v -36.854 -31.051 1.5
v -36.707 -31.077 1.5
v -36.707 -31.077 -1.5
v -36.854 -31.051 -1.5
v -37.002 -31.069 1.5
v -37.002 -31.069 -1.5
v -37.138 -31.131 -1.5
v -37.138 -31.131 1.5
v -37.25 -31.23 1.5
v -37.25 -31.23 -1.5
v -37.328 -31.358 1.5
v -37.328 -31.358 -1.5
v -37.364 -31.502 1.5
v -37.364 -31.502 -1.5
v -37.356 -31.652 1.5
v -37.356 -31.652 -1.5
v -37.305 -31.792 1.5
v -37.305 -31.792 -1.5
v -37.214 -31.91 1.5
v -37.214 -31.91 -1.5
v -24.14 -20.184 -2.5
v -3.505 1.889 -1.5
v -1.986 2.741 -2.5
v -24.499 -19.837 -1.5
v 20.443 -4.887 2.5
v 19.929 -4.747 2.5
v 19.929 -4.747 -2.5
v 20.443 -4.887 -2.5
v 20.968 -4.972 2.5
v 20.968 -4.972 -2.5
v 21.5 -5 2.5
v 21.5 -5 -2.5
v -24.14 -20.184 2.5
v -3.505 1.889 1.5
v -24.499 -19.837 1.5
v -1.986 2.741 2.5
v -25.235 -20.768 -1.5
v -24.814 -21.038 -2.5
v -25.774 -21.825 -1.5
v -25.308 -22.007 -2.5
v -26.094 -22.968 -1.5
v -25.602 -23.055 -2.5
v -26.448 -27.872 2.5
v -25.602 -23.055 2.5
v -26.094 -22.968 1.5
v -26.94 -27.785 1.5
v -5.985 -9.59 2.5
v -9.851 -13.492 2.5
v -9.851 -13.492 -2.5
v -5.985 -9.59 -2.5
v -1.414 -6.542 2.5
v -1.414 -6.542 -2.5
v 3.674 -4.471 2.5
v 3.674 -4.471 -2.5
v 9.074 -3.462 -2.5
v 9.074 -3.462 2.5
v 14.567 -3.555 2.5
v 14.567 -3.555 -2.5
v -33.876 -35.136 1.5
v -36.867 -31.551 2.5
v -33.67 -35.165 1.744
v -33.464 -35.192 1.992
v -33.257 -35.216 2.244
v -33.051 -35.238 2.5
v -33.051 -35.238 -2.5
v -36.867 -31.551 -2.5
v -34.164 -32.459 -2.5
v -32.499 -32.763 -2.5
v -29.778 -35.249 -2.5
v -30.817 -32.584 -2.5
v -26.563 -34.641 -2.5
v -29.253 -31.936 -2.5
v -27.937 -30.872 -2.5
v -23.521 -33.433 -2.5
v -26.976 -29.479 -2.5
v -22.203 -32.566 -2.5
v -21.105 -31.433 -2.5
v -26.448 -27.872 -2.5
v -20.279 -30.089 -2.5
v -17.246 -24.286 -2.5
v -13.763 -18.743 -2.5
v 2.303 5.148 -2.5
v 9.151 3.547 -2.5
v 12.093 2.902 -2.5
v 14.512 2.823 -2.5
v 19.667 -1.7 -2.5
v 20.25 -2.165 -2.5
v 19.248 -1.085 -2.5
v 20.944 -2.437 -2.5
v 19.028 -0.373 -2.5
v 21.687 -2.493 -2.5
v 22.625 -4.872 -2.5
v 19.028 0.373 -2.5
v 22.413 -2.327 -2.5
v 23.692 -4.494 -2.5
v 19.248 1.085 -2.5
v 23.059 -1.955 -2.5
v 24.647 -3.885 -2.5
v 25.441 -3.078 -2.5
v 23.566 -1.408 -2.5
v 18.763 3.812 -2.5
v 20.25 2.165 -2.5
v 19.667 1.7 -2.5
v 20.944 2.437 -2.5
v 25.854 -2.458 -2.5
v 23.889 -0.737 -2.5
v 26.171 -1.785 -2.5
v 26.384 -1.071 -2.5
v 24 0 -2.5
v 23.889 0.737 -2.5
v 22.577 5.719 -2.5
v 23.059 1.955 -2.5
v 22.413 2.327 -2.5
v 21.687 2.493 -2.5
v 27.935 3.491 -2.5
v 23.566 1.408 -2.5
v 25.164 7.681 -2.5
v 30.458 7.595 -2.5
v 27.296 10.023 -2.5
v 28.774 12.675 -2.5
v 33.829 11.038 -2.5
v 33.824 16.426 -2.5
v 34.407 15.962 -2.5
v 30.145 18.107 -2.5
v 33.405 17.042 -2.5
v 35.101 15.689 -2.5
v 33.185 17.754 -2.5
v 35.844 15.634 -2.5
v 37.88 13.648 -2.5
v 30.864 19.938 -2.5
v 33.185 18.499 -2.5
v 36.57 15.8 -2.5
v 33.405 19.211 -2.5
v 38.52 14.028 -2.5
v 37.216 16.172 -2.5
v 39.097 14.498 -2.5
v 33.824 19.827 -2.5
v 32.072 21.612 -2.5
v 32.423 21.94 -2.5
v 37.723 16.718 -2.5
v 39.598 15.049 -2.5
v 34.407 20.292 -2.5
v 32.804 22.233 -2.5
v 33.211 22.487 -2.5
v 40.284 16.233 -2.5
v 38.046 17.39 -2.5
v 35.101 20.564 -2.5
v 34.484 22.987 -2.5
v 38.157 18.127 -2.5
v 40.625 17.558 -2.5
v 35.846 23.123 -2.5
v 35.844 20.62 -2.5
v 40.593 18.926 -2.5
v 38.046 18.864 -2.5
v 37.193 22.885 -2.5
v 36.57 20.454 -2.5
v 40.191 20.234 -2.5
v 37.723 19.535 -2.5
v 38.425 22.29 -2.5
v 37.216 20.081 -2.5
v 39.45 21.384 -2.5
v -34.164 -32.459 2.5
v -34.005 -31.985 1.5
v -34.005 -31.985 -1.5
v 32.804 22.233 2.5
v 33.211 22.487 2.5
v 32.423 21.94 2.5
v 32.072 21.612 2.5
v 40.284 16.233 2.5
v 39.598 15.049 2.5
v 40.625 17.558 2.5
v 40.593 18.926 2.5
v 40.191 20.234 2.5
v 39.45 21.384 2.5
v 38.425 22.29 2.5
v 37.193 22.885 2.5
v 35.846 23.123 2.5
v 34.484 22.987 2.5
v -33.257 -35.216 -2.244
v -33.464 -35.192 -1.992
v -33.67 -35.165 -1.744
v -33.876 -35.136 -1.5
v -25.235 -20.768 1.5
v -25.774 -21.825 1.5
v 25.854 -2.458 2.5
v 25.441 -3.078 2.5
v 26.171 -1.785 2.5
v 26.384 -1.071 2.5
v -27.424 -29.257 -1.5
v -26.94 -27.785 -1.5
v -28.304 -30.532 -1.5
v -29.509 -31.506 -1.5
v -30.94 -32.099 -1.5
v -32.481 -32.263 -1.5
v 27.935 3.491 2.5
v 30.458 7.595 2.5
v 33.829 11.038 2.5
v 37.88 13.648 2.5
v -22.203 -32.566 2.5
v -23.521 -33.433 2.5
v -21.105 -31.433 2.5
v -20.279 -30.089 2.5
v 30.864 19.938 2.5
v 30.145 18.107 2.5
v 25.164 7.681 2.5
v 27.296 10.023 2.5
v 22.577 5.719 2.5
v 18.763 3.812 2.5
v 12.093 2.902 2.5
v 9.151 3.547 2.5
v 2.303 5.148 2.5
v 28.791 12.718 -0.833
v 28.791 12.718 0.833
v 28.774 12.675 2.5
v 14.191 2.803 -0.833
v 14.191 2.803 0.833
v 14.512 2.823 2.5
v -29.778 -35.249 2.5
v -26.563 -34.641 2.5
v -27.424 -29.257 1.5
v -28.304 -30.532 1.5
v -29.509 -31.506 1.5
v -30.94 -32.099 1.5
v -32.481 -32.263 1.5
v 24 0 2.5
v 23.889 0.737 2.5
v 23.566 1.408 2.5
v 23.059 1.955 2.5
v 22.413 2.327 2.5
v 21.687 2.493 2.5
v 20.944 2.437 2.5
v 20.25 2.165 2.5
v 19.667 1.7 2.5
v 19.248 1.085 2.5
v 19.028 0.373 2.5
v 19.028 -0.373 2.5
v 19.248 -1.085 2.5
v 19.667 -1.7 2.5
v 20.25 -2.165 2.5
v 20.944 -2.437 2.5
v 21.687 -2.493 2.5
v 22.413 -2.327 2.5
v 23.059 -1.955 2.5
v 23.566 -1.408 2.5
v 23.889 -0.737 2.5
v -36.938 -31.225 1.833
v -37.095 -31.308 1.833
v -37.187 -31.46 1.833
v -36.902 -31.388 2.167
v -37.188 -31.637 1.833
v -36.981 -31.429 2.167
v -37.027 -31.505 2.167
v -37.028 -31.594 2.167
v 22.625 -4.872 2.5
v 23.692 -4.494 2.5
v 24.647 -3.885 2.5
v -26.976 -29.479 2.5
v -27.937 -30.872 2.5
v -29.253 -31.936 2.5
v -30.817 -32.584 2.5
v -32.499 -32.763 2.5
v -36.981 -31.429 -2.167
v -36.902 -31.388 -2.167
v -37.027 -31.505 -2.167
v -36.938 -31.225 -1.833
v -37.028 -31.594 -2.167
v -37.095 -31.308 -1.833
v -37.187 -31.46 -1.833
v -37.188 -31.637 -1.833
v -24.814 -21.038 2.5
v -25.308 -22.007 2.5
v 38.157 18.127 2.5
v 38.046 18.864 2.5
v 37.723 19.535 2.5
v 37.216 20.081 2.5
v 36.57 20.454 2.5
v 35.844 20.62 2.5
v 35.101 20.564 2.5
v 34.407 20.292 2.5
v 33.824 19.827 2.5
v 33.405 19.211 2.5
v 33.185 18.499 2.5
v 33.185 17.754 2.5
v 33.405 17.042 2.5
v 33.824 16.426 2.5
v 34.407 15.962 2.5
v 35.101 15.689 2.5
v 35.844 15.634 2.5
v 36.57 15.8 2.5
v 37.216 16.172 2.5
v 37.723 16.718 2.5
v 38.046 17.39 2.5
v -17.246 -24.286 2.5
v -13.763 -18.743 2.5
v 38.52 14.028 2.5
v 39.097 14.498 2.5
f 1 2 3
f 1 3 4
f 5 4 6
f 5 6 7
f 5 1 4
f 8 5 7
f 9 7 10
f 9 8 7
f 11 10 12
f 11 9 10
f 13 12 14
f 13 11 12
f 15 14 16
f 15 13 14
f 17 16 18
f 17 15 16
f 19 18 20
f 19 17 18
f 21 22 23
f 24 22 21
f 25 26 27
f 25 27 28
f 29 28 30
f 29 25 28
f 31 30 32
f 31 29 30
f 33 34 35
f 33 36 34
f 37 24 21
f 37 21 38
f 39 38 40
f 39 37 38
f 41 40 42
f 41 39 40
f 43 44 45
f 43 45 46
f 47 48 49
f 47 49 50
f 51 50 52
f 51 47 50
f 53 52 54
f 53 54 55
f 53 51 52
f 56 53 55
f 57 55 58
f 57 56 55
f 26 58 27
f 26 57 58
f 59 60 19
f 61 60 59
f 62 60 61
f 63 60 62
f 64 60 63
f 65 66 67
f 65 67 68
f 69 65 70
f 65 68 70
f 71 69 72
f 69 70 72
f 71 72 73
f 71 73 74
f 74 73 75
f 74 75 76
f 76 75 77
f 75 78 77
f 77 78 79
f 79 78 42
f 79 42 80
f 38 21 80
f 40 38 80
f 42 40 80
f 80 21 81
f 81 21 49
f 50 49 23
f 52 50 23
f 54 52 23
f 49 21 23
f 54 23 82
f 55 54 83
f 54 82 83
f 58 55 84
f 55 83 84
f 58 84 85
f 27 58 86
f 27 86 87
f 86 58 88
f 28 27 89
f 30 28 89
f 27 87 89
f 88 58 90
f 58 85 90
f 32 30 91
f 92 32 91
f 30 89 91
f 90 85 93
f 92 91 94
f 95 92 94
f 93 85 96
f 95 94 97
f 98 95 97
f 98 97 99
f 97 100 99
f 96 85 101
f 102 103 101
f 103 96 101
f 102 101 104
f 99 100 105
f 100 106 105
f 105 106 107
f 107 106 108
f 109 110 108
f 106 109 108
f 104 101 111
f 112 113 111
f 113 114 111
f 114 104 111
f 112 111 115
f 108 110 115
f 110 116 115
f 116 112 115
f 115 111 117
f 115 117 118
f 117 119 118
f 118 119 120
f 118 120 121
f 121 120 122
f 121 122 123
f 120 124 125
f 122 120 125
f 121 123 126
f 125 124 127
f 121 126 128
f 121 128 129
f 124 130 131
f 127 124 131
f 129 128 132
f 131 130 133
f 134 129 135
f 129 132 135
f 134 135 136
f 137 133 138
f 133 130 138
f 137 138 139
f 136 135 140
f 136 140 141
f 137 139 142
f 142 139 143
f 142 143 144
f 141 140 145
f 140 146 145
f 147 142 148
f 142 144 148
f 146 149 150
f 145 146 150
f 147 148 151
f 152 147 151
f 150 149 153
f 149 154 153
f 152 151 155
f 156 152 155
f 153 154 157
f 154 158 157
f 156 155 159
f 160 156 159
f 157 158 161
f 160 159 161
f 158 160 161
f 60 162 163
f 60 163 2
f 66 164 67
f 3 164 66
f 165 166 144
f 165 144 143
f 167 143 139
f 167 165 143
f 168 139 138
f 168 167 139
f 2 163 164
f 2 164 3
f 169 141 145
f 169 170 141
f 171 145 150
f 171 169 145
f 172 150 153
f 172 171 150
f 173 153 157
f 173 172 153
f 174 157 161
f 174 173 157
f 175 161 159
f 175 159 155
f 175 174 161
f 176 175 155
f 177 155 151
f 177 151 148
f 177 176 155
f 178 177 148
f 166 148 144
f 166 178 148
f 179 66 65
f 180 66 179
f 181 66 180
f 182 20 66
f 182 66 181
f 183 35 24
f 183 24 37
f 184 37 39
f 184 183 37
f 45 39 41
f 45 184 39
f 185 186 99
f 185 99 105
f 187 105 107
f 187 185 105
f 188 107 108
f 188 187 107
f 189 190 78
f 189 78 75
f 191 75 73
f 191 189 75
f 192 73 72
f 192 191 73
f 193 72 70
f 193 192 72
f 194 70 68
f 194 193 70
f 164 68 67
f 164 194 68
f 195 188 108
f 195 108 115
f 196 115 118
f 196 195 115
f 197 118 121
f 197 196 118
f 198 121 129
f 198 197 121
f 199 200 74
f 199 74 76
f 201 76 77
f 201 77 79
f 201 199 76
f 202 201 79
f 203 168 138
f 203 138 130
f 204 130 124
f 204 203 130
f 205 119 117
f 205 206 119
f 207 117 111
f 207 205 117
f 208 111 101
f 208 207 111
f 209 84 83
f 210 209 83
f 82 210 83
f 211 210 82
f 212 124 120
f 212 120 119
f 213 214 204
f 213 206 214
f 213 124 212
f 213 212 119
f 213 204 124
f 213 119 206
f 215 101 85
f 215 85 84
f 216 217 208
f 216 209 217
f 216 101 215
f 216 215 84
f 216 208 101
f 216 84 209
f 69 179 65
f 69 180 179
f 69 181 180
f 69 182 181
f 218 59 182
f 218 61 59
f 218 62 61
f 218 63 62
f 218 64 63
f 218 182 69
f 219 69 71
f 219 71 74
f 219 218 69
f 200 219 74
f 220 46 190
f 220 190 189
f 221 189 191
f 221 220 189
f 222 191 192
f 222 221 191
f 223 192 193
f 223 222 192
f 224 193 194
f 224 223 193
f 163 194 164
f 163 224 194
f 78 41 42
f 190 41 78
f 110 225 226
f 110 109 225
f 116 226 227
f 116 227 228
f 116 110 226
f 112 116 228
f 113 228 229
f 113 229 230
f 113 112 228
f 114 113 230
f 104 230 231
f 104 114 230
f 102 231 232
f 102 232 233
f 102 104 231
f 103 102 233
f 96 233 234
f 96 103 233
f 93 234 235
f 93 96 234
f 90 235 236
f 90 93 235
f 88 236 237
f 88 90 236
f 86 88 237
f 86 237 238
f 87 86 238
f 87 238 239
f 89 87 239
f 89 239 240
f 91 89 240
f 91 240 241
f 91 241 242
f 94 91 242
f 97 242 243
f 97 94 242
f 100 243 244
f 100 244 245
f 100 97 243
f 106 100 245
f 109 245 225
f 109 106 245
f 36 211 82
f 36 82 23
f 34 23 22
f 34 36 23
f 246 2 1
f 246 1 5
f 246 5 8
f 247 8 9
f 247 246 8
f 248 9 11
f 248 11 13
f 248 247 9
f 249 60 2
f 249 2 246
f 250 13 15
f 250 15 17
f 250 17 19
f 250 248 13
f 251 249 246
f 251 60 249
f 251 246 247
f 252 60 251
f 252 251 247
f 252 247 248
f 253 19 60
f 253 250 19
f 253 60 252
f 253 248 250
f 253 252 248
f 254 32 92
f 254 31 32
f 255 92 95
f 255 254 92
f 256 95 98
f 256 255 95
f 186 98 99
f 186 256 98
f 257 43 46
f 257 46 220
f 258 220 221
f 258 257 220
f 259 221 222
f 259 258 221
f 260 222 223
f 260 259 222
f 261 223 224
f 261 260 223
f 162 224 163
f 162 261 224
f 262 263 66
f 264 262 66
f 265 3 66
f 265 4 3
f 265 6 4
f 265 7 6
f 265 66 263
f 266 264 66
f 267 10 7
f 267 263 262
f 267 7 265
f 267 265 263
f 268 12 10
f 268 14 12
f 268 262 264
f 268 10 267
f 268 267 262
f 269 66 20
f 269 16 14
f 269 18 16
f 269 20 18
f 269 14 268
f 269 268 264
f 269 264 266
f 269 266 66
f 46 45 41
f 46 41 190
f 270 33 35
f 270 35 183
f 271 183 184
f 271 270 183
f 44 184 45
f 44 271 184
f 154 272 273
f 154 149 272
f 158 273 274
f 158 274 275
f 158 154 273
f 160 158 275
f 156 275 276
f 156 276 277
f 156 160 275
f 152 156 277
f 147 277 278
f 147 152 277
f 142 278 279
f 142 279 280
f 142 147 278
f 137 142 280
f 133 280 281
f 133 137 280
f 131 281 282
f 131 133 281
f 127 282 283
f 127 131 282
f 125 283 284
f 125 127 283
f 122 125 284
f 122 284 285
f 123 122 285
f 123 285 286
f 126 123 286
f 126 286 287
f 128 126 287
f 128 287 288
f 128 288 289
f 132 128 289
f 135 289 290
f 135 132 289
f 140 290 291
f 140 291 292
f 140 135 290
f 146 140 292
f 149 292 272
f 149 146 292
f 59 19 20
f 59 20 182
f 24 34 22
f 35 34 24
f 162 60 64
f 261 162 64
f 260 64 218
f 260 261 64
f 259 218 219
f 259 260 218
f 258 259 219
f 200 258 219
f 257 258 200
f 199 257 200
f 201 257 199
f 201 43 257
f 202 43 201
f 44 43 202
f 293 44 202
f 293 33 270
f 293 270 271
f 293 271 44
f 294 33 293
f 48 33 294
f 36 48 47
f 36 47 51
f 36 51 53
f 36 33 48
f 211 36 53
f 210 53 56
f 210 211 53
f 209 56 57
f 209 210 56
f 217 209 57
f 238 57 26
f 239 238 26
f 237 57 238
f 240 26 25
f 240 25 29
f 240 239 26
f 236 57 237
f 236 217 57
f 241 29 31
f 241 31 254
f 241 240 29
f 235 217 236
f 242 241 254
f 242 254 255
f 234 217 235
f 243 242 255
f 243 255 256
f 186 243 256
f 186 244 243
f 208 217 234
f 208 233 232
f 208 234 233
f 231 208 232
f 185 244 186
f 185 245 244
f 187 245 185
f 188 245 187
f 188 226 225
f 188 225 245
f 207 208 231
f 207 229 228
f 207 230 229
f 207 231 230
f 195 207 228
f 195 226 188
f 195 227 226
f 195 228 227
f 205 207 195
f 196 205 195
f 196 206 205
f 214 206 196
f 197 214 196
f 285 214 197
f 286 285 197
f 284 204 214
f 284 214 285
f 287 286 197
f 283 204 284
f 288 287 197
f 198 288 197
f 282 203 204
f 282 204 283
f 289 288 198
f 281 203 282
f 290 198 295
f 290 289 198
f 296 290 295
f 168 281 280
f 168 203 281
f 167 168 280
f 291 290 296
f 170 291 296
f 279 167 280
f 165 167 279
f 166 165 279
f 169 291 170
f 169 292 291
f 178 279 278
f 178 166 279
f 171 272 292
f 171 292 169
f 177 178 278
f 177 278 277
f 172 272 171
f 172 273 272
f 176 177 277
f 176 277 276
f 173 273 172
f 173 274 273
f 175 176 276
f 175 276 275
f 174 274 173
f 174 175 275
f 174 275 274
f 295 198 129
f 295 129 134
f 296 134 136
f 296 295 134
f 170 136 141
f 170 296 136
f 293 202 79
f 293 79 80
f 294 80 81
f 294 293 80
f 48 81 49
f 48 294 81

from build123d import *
from OCP.BRepFilletAPI import BRepFilletAPI_MakeChamfer

# Parameters (mm, degrees)
SKETCH_1_R          = 2.5
EXTRUDE_1_DEPTH     = 2.5
SKETCH_2_OUTSIDE_W  = 116.118
SKETCH_2_OUTSIDE_H  = 88.955
CUT_EXTRUDE_1_DEPTH = 5
CHAMFER_1_SIZE      = 1
CHAMFER_1_SIZE_2    = 0.5
CHAMFER_2_SIZE      = 0.5
CHAMFER_2_SIZE_2    = 1


with BuildPart() as part:
    # 草圖1 → 填料-伸長1 (new, symmetric)
    with BuildSketch(Plane.XY):
        with BuildLine():
            Line((33.210571119, 22.487406669), (9.212656684, 9.024071248))
            Line((9.212656684, 9.024071248), (9.212656684, 13.217540535))
            Line((9.212656684, 13.217540535), (-51.018500429, 13.217540535))
            Line((-51.018500429, 13.217540535), (-51.018500429, -41.386180002))
            Line((-51.018500429, -41.386180002), (9.212656684, -41.386180002))
            Line((9.212656684, -41.386180002), (9.212656684, -5))
            Line((9.212656684, -5), (21.5, -5))
            ThreePointArc((21.5, -5), (23.692257033, -4.493774483), (25.440603486, -3.07760364))
            Line((25.440603486, -3.07760364), (39.59758023, 15.049172396))
            ThreePointArc((39.59758023, 15.049172396), (39.450390654, 21.384077206), (33.210571119, 22.487406669))
        make_face()
        with Locations((21.5, 0)):
            Circle(SKETCH_1_R, mode=Mode.SUBTRACT)
        with Locations((35.656976744, 18.126776036)):
            Circle(SKETCH_1_R, mode=Mode.SUBTRACT)
    extrude(amount=EXTRUDE_1_DEPTH, both=True)

    # 草圖2 outside → 除料-伸長1 (cut)
    with BuildSketch(Plane.XY.offset(2.5)):
        with Locations((-5.181, -9.1295)):
            Rectangle(SKETCH_2_OUTSIDE_W, SKETCH_2_OUTSIDE_H)
        with BuildLine():
            Line((-3.504662874, 1.889387135), (-24.499095951, -19.837093245))
            ThreePointArc((-24.499095951, -19.837093245), (-25.530846828, -21.28330144), (-26.093887373, -22.968238639))
            Line((-26.093887373, -22.968238639), (-26.940110928, -27.785073774))
            ThreePointArc((-26.940110928, -27.785073774), (-29.508767127, -31.506192899), (-34.004940633, -31.984884889))
            Line((-34.004940633, -31.984884889), (-36.707285896, -31.076719678))
            ThreePointArc((-36.707285896, -31.076719678), (-37.293807717, -31.290934133), (-37.214008802, -31.910230356))
            Line((-37.214008802, -31.910230356), (-33.875603228, -35.136152419))
            ThreePointArc((-33.875603228, -35.136152419), (-28.5650672, -35.094081272), (-23.520676583, -33.433453021))
            ThreePointArc((-23.520676583, -33.433453021), (-21.623015625, -32.029319154), (-20.278640263, -30.088864592))
            ThreePointArc((-20.278640263, -30.088864592), (-15.559314436, -21.479893225), (-9.851228903, -13.492141112))
            ThreePointArc((-9.851228903, -13.492141112), (3.673898096, -4.470950273), (19.929199503, -4.746850092))
            ThreePointArc((19.929199503, -4.746850092), (23.974199209, -4.344920975), (26.383894798, -1.071247685))
            ThreePointArc((26.383894798, -1.071247685), (30.458421446, 7.595163953), (37.879524863, 13.647905658))
            ThreePointArc((37.879524863, 13.647905658), (39.697047859, 21.072590929), (32.072223107, 21.612395258))
            add(Edge.make_bspline(
                [(32.072223107, 21.612395258), (29.619553058, 19.089968877), (30.529442098, 9.384107467), (14.497116464, 0.221014353), (7.895302384, 4.290965143), (2.303499892, 5.147888773)],
                knots=[0, 0, 0, 0, 0.241565864, 0.691252681, 1, 1, 1, 1], degree=3))
            Line((2.303499892, 5.147888773), (-3.504662874, 1.889387135))
        make_face(mode=Mode.SUBTRACT)
    extrude(amount=-CUT_EXTRUDE_1_DEPTH, mode=Mode.SUBTRACT)

    # 導角1
    chamfer_1_edges_1 = [part.edges().sort_by_distance(p)[0] for p in [
        (-35.544806015, -33.523191388, 2.5),
    ]]
    chamfer_1_side_1 = [part.faces().sort_by_distance(p)[0] for p in [
        (-35.544806015, -33.523191388, 2.49),
    ]]
    chamfer_1_edges_2 = [part.edges().sort_by_distance(p)[0] for p in [
        (-37.293807717, -31.290934133, 2.5),
    ]]
    chamfer_1_side_2 = [part.faces().sort_by_distance(p)[0] for p in [
        (-37.293807717, -31.290934133, 2.49),
    ]]
    chamfer_1_edges_3 = [part.edges().sort_by_distance(p)[0] for p in [
        (-35.356113265, -31.530802283, 2.5),
    ]]
    chamfer_1_side_3 = [part.faces().sort_by_distance(p)[0] for p in [
        (-35.356113265, -31.530802283, 2.49),
    ]]
    chamfer_1_edges_4 = [part.edges().sort_by_distance(p)[0] for p in [
        (-29.508767127, -31.506192899, 2.5),
    ]]
    chamfer_1_side_4 = [part.faces().sort_by_distance(p)[0] for p in [
        (-29.508767127, -31.506192899, 2.49),
    ]]
    chamfer_1_edges_5 = [part.edges().sort_by_distance(p)[0] for p in [
        (-26.516999151, -25.376656206, 2.5),
    ]]
    chamfer_1_side_5 = [part.faces().sort_by_distance(p)[0] for p in [
        (-26.516999151, -25.376656206, 2.49),
    ]]
    chamfer_1_edges_6 = [part.edges().sort_by_distance(p)[0] for p in [
        (-25.530846828, -21.28330144, 2.5),
    ]]
    chamfer_1_side_6 = [part.faces().sort_by_distance(p)[0] for p in [
        (-25.530846828, -21.28330144, 2.49),
    ]]
    chamfer_1_edges_7 = [part.edges().sort_by_distance(p)[0] for p in [
        (-14.001879412, -8.973853055, 2.5),
    ]]
    chamfer_1_side_7 = [part.faces().sort_by_distance(p)[0] for p in [
        (-14.001879412, -8.973853055, 2.49),
    ]]
    chamfer_1 = BRepFilletAPI_MakeChamfer(part.part.solid().wrapped)
    for e in chamfer_1_edges_1:
        chamfer_1.Add(CHAMFER_1_SIZE - 0.0001, CHAMFER_1_SIZE_2 - 0.0001, e.wrapped, chamfer_1_side_1[0].wrapped)
    for e in chamfer_1_edges_2:
        chamfer_1.Add(CHAMFER_1_SIZE - 0.0001, CHAMFER_1_SIZE_2 - 0.0001, e.wrapped, chamfer_1_side_2[0].wrapped)
    for e in chamfer_1_edges_3:
        chamfer_1.Add(CHAMFER_1_SIZE - 0.0001, CHAMFER_1_SIZE_2 - 0.0001, e.wrapped, chamfer_1_side_3[0].wrapped)
    for e in chamfer_1_edges_4:
        chamfer_1.Add(CHAMFER_1_SIZE - 0.0001, CHAMFER_1_SIZE_2 - 0.0001, e.wrapped, chamfer_1_side_4[0].wrapped)
    for e in chamfer_1_edges_5:
        chamfer_1.Add(CHAMFER_1_SIZE - 0.0001, CHAMFER_1_SIZE_2 - 0.0001, e.wrapped, chamfer_1_side_5[0].wrapped)
    for e in chamfer_1_edges_6:
        chamfer_1.Add(CHAMFER_1_SIZE - 0.0001, CHAMFER_1_SIZE_2 - 0.0001, e.wrapped, chamfer_1_side_6[0].wrapped)
    for e in chamfer_1_edges_7:
        chamfer_1.Add(CHAMFER_1_SIZE - 0.0001, CHAMFER_1_SIZE_2 - 0.0001, e.wrapped, chamfer_1_side_7[0].wrapped)
    add(Compound.cast(chamfer_1.Shape()), mode=Mode.REPLACE)  # a hair under: the kernel refuses the full size

    # 導角2
    chamfer_2_edges_1 = [part.edges().sort_by_distance(p)[0] for p in [
        (-14.001879412, -8.973853055, -2.5),
    ]]
    chamfer_2_side_1 = [part.faces().sort_by_distance(p)[0] for p in [
        (-13.994688233, -8.980801936, -2.5),
    ]]
    chamfer_2_edges_2 = [part.edges().sort_by_distance(p)[0] for p in [
        (-25.530846828, -21.28330144, -2.5),
    ]]
    chamfer_2_side_2 = [part.faces().sort_by_distance(p)[0] for p in [
        (-25.521936065, -21.287839974, -2.5),
    ]]
    chamfer_2_edges_3 = [part.edges().sort_by_distance(p)[0] for p in [
        (-26.516999151, -25.376656206, -2.5),
    ]]
    chamfer_2_side_3 = [part.faces().sort_by_distance(p)[0] for p in [
        (-26.507149986, -25.378386512, -2.5),
    ]]
    chamfer_2_edges_4 = [part.edges().sort_by_distance(p)[0] for p in [
        (-29.508767127, -31.506192899, -2.5),
    ]]
    chamfer_2_side_4 = [part.faces().sort_by_distance(p)[0] for p in [
        (-29.503657181, -31.514788738, -2.5),
    ]]
    chamfer_2_edges_5 = [part.edges().sort_by_distance(p)[0] for p in [
        (-35.356113265, -31.530802283, -2.5),
    ]]
    chamfer_2_side_5 = [part.faces().sort_by_distance(p)[0] for p in [
        (-35.359298842, -31.540281318, -2.5),
    ]]
    chamfer_2_edges_6 = [part.edges().sort_by_distance(p)[0] for p in [
        (-37.293807717, -31.290934133, -2.5),
    ]]
    chamfer_2_side_6 = [part.faces().sort_by_distance(p)[0] for p in [
        (-37.285262858, -31.296128878, -2.5),
    ]]
    chamfer_2_edges_7 = [part.edges().sort_by_distance(p)[0] for p in [
        (-35.544806015, -33.523191388, -2.5),
    ]]
    chamfer_2_side_7 = [part.faces().sort_by_distance(p)[0] for p in [
        (-35.544806015, -33.523191388, -2.49),
    ]]
    chamfer_2 = BRepFilletAPI_MakeChamfer(part.part.solid().wrapped)
    for e in chamfer_2_edges_1:
        chamfer_2.Add(CHAMFER_2_SIZE - 0.0001, CHAMFER_2_SIZE_2 - 0.0001, e.wrapped, chamfer_2_side_1[0].wrapped)
    for e in chamfer_2_edges_2:
        chamfer_2.Add(CHAMFER_2_SIZE - 0.0001, CHAMFER_2_SIZE_2 - 0.0001, e.wrapped, chamfer_2_side_2[0].wrapped)
    for e in chamfer_2_edges_3:
        chamfer_2.Add(CHAMFER_2_SIZE - 0.0001, CHAMFER_2_SIZE_2 - 0.0001, e.wrapped, chamfer_2_side_3[0].wrapped)
    for e in chamfer_2_edges_4:
        chamfer_2.Add(CHAMFER_2_SIZE - 0.0001, CHAMFER_2_SIZE_2 - 0.0001, e.wrapped, chamfer_2_side_4[0].wrapped)
    for e in chamfer_2_edges_5:
        chamfer_2.Add(CHAMFER_2_SIZE - 0.0001, CHAMFER_2_SIZE_2 - 0.0001, e.wrapped, chamfer_2_side_5[0].wrapped)
    for e in chamfer_2_edges_6:
        chamfer_2.Add(CHAMFER_2_SIZE - 0.0001, CHAMFER_2_SIZE_2 - 0.0001, e.wrapped, chamfer_2_side_6[0].wrapped)
    for e in chamfer_2_edges_7:
        chamfer_2.Add(CHAMFER_2_SIZE_2 - 0.0001, CHAMFER_2_SIZE - 0.0001, e.wrapped, chamfer_2_side_7[0].wrapped)
    add(Compound.cast(chamfer_2.Shape()), mode=Mode.REPLACE)  # a hair under: the kernel refuses the full size


solid = part.part
